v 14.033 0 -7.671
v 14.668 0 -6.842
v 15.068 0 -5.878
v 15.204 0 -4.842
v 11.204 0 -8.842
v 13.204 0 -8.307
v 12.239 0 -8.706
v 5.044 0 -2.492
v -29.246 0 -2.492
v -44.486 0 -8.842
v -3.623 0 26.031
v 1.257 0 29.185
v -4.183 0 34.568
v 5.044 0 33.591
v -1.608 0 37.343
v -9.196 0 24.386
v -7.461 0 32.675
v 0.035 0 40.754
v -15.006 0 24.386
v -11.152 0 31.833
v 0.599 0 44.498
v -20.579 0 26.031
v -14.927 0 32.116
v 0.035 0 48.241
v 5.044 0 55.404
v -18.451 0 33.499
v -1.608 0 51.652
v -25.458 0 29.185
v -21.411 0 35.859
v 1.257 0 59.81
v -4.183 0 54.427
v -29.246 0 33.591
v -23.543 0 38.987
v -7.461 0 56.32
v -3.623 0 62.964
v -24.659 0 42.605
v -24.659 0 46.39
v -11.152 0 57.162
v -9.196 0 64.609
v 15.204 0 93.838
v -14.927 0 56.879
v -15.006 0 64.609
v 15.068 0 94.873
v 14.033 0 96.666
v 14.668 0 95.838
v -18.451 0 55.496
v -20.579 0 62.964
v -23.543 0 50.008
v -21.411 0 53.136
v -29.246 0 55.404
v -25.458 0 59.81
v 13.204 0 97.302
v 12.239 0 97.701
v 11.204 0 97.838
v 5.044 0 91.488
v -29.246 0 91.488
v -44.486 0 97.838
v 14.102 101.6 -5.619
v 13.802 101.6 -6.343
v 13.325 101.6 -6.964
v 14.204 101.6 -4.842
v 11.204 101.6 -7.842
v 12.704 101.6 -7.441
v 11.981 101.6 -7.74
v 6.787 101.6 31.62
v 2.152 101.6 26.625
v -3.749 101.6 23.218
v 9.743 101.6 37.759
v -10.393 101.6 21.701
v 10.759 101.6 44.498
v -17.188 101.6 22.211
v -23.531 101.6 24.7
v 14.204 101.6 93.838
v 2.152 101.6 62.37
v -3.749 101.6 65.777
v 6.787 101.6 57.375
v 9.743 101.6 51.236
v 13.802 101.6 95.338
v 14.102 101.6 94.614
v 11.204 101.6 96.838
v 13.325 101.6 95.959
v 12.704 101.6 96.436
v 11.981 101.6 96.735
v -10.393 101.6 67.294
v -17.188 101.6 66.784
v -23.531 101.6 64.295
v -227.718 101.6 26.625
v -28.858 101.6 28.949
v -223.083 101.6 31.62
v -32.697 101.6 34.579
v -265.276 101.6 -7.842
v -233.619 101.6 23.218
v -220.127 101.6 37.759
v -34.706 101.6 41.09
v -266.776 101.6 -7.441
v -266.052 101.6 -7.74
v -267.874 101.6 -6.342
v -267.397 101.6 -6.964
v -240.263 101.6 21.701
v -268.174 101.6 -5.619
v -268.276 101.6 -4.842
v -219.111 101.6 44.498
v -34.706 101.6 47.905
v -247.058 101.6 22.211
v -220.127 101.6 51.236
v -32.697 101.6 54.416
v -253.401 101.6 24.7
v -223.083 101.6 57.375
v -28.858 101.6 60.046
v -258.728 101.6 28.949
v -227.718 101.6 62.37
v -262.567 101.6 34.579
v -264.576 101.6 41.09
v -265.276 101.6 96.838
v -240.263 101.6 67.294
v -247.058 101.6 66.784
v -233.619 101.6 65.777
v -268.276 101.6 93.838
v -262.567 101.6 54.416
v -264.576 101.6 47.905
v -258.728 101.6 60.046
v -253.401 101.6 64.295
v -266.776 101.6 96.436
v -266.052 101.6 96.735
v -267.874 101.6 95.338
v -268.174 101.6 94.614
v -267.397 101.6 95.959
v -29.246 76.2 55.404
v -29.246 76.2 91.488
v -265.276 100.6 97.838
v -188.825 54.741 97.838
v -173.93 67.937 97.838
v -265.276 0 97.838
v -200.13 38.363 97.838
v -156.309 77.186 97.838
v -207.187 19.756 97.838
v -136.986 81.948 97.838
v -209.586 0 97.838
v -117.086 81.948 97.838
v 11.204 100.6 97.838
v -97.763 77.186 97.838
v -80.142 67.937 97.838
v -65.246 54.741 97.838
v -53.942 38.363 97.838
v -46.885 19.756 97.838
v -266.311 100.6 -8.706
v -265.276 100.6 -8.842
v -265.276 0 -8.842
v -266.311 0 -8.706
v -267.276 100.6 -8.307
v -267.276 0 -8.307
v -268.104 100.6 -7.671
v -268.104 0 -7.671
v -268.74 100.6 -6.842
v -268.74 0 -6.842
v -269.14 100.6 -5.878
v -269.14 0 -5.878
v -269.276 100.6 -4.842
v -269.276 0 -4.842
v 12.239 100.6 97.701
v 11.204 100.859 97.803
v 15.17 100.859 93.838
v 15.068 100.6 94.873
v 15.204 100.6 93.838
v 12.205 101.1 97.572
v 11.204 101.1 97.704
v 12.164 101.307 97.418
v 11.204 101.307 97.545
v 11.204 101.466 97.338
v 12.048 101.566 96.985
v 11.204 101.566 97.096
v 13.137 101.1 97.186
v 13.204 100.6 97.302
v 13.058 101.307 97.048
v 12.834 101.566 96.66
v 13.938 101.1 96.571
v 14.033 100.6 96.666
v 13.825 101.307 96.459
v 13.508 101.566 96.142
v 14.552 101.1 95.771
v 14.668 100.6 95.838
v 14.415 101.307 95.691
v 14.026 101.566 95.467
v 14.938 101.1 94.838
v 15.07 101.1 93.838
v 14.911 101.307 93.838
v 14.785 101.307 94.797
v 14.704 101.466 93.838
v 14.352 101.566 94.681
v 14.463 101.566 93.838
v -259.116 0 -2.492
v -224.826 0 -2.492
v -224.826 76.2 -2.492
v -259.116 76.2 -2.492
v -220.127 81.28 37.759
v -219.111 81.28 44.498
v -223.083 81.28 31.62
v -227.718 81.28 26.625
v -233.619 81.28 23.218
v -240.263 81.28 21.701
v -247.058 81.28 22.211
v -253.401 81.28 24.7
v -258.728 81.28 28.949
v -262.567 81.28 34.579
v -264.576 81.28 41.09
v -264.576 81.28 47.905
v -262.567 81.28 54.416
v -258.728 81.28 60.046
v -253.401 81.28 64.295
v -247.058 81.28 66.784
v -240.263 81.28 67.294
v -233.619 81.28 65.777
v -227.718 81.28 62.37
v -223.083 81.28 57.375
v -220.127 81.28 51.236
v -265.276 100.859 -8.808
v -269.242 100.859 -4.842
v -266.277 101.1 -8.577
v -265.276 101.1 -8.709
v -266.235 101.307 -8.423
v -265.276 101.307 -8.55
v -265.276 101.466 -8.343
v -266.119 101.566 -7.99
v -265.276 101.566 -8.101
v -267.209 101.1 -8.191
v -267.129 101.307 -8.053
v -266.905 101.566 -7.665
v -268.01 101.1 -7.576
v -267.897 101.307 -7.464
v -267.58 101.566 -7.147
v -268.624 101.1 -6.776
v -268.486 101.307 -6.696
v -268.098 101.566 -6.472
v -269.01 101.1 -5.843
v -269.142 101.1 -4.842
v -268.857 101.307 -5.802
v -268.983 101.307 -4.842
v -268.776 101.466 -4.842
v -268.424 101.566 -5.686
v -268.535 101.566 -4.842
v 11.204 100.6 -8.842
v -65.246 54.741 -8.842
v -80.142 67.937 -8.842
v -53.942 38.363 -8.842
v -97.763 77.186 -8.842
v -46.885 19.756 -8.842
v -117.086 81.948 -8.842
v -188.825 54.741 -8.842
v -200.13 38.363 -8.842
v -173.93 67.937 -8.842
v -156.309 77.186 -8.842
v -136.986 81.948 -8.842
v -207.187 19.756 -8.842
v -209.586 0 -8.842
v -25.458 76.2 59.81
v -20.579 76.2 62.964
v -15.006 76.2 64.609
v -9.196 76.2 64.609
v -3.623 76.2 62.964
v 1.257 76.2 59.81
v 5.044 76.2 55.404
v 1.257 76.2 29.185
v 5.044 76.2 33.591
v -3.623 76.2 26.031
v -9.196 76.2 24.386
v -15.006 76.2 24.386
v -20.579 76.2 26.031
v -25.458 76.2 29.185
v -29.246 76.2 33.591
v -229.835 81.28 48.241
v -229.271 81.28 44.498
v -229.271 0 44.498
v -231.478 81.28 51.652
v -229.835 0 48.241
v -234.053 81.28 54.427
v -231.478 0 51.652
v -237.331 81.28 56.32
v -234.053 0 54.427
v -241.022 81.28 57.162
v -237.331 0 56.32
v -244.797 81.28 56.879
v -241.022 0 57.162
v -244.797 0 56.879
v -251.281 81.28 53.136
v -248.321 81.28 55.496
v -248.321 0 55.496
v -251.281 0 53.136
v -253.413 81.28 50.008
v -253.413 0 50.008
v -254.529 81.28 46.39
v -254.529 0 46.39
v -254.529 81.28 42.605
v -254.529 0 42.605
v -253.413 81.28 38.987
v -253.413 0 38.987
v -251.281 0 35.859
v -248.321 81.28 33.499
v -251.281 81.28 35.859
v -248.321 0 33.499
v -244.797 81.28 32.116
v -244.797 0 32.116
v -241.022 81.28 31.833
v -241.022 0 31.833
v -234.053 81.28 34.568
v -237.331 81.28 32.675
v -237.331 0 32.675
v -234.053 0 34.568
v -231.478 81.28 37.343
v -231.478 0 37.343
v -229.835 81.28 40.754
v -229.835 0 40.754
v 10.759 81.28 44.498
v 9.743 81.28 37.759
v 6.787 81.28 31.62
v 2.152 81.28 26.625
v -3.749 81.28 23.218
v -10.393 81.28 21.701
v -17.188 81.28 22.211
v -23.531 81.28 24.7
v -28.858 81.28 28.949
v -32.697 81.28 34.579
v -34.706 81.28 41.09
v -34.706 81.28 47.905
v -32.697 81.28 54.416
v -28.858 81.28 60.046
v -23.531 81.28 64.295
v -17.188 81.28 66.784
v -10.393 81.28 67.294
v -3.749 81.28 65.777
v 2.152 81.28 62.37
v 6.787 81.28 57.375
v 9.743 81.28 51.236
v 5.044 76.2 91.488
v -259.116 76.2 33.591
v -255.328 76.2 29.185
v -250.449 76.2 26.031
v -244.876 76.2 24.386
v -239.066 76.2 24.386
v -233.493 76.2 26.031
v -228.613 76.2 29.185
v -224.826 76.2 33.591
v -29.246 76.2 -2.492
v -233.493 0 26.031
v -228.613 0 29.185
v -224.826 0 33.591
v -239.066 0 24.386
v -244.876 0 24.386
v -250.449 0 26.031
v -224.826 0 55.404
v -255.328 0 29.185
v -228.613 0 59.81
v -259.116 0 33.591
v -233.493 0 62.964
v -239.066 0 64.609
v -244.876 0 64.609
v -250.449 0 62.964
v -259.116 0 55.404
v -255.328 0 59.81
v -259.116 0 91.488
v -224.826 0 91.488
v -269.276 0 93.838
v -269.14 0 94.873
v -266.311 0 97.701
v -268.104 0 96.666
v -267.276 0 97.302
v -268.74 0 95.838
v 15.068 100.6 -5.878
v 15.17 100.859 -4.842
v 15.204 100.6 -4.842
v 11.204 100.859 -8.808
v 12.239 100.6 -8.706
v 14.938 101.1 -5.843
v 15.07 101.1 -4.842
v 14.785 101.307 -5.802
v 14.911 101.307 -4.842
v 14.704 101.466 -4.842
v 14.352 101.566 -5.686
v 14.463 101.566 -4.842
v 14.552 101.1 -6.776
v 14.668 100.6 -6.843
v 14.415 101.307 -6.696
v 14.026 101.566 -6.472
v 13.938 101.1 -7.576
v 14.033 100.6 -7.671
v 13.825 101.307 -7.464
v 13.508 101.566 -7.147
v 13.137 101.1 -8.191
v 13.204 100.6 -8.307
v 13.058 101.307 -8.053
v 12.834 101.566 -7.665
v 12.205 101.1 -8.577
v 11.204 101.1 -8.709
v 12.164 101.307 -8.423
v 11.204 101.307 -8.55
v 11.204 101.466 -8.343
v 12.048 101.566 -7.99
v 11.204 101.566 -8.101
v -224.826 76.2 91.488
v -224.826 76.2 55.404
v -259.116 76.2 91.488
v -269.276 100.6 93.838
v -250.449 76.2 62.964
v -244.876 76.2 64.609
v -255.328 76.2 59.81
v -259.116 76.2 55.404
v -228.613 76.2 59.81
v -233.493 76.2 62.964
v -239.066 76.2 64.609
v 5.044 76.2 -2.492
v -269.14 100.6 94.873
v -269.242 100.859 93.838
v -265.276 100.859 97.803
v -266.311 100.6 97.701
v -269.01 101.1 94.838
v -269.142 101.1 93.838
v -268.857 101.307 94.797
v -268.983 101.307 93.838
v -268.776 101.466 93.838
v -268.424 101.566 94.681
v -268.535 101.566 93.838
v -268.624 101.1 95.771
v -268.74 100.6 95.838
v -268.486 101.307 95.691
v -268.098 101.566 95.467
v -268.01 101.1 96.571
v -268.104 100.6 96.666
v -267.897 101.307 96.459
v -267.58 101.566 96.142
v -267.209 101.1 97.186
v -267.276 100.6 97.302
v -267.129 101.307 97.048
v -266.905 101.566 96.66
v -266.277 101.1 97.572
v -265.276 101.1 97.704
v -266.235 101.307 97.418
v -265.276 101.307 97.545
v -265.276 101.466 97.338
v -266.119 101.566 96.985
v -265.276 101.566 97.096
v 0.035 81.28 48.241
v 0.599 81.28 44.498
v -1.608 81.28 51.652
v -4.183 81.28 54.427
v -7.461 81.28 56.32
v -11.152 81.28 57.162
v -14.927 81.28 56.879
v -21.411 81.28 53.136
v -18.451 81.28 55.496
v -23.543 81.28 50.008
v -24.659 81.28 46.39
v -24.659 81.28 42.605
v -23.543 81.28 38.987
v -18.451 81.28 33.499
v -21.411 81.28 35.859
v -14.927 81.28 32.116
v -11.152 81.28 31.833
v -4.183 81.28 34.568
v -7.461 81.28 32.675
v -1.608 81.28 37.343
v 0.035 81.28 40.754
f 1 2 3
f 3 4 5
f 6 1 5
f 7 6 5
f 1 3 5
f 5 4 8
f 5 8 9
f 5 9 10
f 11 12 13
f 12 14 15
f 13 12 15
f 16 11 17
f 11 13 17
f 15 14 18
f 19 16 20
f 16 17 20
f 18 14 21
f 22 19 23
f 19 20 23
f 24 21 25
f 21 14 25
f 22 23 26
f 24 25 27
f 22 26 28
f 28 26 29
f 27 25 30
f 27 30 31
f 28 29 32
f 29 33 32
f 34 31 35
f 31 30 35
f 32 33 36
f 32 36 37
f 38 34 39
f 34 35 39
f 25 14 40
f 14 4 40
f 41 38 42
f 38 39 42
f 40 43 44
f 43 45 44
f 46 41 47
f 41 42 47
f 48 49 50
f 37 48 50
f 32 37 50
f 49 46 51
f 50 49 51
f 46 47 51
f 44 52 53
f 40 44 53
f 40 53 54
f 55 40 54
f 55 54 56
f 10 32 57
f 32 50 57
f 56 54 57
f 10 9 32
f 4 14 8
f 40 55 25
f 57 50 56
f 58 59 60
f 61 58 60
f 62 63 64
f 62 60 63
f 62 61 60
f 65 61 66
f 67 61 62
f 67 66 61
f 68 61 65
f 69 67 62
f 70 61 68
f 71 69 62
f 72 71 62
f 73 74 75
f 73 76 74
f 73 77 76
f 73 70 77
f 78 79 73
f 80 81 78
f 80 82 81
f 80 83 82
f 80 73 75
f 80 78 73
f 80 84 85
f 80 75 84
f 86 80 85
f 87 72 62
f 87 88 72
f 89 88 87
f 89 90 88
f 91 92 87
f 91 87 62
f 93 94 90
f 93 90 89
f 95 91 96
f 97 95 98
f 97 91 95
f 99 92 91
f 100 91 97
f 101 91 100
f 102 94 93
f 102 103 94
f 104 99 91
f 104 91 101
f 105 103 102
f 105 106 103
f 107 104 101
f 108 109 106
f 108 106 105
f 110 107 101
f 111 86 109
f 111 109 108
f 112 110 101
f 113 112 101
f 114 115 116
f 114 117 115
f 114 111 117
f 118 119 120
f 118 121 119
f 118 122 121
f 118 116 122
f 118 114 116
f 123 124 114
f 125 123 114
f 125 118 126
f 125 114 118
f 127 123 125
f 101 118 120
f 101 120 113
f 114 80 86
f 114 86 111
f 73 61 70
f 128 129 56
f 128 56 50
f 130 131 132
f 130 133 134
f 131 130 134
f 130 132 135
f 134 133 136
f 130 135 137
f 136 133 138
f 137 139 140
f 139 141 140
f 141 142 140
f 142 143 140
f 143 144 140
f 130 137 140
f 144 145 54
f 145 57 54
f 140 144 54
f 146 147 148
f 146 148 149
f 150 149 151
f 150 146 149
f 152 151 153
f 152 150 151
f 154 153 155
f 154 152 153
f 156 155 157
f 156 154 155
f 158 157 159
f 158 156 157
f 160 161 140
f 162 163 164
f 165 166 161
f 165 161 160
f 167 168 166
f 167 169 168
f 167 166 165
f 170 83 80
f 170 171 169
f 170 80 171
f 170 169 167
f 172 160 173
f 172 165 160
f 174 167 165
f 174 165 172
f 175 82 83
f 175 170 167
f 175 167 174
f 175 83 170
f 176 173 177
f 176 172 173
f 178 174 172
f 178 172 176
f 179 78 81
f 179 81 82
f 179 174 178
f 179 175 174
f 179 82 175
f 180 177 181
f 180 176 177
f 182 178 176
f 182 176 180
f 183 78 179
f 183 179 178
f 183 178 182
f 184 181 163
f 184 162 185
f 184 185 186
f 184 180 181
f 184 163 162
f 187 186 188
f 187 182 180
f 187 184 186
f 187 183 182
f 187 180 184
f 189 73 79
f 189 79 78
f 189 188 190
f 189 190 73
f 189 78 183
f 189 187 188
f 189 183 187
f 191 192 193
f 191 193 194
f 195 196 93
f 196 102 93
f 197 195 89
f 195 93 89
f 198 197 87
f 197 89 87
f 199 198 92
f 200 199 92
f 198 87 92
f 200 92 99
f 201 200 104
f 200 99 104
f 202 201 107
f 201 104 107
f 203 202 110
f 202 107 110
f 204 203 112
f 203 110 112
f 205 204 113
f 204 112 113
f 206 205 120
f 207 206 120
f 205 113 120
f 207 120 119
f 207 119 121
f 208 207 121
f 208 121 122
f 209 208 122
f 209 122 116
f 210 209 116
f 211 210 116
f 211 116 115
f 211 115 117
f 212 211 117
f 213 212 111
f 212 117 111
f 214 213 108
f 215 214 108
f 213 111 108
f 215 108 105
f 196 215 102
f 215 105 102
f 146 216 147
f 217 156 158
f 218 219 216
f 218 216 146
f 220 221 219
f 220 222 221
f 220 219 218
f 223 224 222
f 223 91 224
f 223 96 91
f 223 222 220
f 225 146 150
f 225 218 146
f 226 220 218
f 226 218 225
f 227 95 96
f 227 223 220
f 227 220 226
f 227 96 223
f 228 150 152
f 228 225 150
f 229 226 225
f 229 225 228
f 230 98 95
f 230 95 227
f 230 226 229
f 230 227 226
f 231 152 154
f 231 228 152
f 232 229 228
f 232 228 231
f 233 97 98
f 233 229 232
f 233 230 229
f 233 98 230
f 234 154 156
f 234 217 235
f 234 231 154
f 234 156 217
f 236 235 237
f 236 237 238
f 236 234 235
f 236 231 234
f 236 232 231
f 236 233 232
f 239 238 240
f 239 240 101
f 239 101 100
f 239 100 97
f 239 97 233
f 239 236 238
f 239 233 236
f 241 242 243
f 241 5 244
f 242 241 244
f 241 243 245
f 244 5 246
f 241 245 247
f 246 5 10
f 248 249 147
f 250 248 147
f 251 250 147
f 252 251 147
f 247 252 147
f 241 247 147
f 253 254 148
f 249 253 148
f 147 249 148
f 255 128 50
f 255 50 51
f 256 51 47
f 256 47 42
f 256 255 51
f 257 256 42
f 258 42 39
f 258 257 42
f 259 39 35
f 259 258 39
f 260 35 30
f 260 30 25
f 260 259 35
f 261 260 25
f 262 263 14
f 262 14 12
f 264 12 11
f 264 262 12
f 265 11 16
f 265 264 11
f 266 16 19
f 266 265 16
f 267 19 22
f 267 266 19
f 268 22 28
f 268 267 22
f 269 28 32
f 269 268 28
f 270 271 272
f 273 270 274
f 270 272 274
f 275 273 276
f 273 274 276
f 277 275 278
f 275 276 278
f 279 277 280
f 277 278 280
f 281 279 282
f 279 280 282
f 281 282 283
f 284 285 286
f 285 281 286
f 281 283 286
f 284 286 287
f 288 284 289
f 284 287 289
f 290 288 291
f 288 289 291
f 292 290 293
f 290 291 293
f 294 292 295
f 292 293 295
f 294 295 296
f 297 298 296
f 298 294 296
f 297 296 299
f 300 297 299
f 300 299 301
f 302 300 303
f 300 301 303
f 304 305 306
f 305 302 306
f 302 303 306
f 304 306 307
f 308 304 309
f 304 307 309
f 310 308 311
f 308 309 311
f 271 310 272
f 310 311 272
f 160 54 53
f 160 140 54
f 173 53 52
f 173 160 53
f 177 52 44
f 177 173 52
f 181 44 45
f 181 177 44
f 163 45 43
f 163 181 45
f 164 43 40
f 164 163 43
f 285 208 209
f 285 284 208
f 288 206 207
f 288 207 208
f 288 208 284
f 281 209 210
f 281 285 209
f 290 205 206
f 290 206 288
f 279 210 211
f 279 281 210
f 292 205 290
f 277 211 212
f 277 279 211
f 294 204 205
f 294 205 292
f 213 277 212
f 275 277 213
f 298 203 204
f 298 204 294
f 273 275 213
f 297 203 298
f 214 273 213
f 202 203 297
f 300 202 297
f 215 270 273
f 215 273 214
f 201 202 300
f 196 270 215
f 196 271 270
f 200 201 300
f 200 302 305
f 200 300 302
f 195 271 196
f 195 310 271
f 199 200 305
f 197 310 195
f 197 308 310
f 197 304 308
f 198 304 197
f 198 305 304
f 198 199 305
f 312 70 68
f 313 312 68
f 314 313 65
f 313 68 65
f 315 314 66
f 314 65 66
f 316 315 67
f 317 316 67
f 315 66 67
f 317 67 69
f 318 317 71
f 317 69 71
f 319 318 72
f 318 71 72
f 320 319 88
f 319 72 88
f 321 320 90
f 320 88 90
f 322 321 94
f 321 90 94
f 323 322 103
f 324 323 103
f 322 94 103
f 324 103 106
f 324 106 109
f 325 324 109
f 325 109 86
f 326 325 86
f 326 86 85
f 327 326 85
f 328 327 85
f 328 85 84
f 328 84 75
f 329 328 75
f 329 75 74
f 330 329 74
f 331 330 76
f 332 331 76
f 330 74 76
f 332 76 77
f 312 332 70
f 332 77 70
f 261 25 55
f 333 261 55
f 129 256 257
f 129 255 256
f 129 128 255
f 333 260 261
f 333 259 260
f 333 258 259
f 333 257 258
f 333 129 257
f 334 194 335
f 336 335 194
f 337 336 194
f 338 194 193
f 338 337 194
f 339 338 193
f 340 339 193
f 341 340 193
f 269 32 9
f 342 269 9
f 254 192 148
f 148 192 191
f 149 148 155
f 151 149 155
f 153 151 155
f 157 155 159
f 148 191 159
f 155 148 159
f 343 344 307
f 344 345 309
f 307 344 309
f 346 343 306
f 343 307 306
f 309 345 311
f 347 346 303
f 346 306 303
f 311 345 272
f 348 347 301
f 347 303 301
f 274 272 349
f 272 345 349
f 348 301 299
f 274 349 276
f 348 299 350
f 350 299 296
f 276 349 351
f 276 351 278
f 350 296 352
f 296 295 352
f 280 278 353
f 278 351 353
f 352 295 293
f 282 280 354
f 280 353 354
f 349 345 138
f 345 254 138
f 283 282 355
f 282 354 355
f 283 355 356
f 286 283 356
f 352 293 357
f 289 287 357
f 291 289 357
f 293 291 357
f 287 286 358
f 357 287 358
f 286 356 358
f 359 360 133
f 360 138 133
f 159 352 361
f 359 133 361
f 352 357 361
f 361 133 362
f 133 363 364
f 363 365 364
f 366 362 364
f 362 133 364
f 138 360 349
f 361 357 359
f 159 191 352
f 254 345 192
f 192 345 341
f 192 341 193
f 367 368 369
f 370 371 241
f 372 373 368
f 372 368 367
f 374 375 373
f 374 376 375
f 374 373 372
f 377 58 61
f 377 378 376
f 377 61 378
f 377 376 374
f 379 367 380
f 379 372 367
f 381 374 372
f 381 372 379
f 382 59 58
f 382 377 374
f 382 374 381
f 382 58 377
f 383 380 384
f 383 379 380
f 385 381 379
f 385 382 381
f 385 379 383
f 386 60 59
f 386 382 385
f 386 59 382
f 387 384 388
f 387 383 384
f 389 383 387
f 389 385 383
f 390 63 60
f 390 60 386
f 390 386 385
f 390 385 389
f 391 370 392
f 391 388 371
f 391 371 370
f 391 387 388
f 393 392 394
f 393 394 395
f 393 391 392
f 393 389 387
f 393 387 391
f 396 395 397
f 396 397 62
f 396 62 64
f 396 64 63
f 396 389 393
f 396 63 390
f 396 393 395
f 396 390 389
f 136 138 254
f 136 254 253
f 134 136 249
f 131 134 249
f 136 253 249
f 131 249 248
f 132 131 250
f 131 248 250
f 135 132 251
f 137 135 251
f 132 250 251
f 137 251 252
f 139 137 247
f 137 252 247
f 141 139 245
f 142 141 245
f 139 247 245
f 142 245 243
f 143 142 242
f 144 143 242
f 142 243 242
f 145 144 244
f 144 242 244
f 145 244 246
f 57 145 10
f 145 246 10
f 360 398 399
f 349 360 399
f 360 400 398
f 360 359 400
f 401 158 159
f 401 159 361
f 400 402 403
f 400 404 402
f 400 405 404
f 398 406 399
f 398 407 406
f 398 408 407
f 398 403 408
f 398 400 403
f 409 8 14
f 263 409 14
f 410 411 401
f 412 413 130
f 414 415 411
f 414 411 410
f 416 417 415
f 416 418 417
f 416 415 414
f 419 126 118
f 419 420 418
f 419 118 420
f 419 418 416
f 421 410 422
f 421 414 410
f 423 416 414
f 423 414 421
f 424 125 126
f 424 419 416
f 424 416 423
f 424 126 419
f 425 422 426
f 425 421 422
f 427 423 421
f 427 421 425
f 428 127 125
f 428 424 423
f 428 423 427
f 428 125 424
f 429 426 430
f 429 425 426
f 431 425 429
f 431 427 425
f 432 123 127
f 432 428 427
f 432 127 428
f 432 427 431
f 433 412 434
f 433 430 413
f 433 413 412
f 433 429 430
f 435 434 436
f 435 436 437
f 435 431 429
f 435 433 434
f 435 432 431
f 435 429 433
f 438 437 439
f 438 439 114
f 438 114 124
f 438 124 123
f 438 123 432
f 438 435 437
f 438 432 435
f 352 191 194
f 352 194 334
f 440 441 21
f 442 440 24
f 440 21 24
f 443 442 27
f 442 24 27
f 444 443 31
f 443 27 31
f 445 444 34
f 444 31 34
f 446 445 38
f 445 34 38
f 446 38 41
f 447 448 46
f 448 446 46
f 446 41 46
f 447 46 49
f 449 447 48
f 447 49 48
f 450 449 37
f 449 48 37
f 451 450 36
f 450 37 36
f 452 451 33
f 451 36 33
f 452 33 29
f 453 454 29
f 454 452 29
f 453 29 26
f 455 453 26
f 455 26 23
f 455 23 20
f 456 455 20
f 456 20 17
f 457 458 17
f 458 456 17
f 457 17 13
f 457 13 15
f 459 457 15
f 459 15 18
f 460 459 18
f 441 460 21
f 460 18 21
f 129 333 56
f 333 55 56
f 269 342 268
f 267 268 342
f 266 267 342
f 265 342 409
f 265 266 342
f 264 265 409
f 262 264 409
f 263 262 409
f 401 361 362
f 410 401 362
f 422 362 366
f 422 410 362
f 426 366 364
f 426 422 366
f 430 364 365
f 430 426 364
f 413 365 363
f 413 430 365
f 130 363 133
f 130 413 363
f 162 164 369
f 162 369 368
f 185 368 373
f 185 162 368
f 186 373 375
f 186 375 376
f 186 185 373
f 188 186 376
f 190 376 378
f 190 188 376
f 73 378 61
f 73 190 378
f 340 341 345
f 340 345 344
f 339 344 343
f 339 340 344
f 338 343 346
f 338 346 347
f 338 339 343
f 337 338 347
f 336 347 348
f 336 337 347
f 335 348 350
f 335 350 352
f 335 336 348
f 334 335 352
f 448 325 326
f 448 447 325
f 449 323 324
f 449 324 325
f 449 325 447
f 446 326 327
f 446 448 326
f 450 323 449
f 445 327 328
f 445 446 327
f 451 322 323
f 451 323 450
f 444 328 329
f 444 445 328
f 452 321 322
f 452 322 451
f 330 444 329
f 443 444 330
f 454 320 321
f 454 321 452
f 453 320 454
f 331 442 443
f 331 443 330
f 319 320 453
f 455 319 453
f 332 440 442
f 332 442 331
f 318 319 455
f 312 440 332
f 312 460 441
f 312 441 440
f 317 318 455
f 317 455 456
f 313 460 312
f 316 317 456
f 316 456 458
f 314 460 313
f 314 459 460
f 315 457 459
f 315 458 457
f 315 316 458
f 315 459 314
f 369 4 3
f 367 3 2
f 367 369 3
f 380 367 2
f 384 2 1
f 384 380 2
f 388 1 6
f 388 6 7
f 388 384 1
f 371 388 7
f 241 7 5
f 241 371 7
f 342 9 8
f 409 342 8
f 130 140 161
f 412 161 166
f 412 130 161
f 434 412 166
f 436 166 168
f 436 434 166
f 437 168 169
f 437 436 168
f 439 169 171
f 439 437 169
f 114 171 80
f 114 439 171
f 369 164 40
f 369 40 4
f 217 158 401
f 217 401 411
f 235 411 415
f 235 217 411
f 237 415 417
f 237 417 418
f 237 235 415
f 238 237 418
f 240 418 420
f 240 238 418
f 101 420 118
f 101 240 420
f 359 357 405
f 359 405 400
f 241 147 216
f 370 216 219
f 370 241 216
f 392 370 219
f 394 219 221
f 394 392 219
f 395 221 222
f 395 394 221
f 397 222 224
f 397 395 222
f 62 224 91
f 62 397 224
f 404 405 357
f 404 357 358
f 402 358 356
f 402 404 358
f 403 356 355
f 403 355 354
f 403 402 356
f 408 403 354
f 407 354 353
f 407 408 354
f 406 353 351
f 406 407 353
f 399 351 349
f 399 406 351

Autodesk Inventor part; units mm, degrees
ref_plane "YZ Plane" through (0, 0, 0) normal (1, 0, 0) x (0, 1, 0)
ref_plane "XZ Plane" through (0, 0, 0) normal (0, 1, 0) x (-1, 0, 0)
ref_plane "XY Plane" through (0, 0, 0) normal (0, 0, 1) x (1, 0, 0)
sketch "Sketch2" plane through (0, 0, 0) normal (0, 1, 0) x (-1, 0, 0)
  line L0 (-15.2041, -8.8425) -> (269.2759, -8.8425)
  line L1 (269.2759, -8.8425) -> (269.2759, 97.8375)
  line L2 (269.2759, 97.8375) -> (-15.2041, 97.8375)
  line L3 (-15.2041, 97.8375) -> (-15.2041, -8.8425)
  point P0 (0, 0)
  dimension "d5" = 284.48
  dimension "d6" = 106.68
  dimension "d7" = 284.48
  dimension "d8" = 106.68
extrude "Extrusion1" add sketch "Sketch2" along normal blind 101.6
sketch "Sketch3" plane through (15.2041, 0, -8.8425) normal (0, 0, -1) x (-1, 0, 0)
  line L0 (0, 0) -> (284.48, 0) projected
  arc A0 (224.79, 0) -> (59.69, 0) centre (142.24, 0) ccw
  line L1 (59.69, 0) -> (224.79, 0)
  point P0 (15.2041, 0)
extrude "Extrusion2" cut sketch "Sketch3" against normal blind 127
sketch "Sketch4" plane through (0, 0, 0) normal (0, -1, 0) x (1, 0, 0)
  line L0 (-209.5859, -8.8425) -> (-209.5859, 97.8375) projected
  line L1 (-269.2759, 97.8375) -> (-209.5859, 97.8375) projected
  line L2 (-269.2759, -8.8425) -> (-269.2759, 97.8375) projected
  line L3 (-209.5859, -8.8425) -> (-269.2759, -8.8425) projected
  line L4 (-44.4859, 97.8375) -> (15.2041, 97.8375) projected
  line L5 (-44.4859, 97.8375) -> (-44.4859, -8.8425) projected
  line L6 (15.2041, -8.8425) -> (-44.4859, -8.8425) projected
  line L7 (15.2041, 97.8375) -> (15.2041, -8.8425) projected
  line L8 (-44.4859, 97.8375) -> (15.2041, 97.8375) projected
  line L9 (-241.3709, 97.8375) -> (-241.3709, 91.4875) construction
  line L10 (-209.5859, 77.888) -> (-224.8259, 77.888) construction
  line L11 (-269.2759, 47.5596) -> (-259.1159, 47.5596) construction
  line L12 (-239.4309, -8.8425) -> (-239.4309, -2.4925) construction
  line L13 (-259.1159, -2.4925) -> (-259.1159, 91.4875)
  line L14 (-259.1159, 91.4875) -> (-224.8259, 91.4875)
  line L15 (-224.8259, 91.4875) -> (-224.8259, -2.4925)
  line L16 (-224.8259, -2.4925) -> (-259.1159, -2.4925)
  point P0 (0, 0)
  dimension "d15" = 6.35
  dimension "d16" = 15.24
  dimension "d17" = 10.16
  dimension "d18" = 6.35
extrude "Extrusion3" cut sketch "Sketch4" against normal blind 76.2 contours L13 L14 L15 L16
sketch "Sketch5" plane through (0, 76.2, 0) normal (0, -1, 0) x (1, 0, 0)
  line L0 (-259.1159, 91.4875) -> (-224.8259, 91.4875) projected
  line L1 (-259.1159, -2.4925) -> (-259.1159, 91.4875) projected
  line L2 (-224.8259, -2.4925) -> (-259.1159, -2.4925) projected
  line L3 (-224.8259, 91.4875) -> (-224.8259, -2.4925) projected
  line L4 (-259.1159, 44.4975) -> (-224.8259, 44.4975) construction
  line L5 (-241.9709, 91.4875) -> (-241.9709, 84.1907) construction
  line L6 (-241.9709, 84.1907) -> (-241.9709, 84.1907) construction
  line L7 (-241.9709, 84.1907) -> (-241.9709, -2.4925) construction
  circle A0 centre (-241.9709, 44.4975) radius 20.32
  point P0 (0, 0)
  dimension "d21" = 40.64
  dimension "d22" = 0
extrude "Extrusion4" add sketch "Sketch5" along normal blind 76.2 contours A0 L3 L1 | L1 A0 | A0 L3
sketch "Sketch6" plane through (0, 0, 0) normal (0, -1, 0) x (1, 0, 0)
  arc A0 (-259.1159, 33.5911) -> (-224.8259, 33.5911) centre (-241.9709, 44.4975) ccw projected
  circle A1 centre (-241.9709, 44.4975) radius 12.7
  point P0 (0, 0)
  dimension "d25" = 25.4
extrude "Extrusion5" cut sketch "Sketch6" against normal blind 101.6
sketch "Sketch7" plane through (0, 101.6, 0) normal (0, 1, 0) x (1, 0, 0)
  circle A0 centre (-241.9709, -44.4975) radius 12.7 projected
  circle A1 centre (-241.9709, -44.4975) radius 22.86
  point P0 (0, 0)
  dimension "d29" = 45.72
extrude "Extrusion6" cut sketch "Sketch7" against normal blind 20.32
sketch "Sketch8" plane through (0, 0, 0) normal (0, -1, 0) x (1, 0, 0)
  line L0 (-44.4859, 97.8375) -> (-44.4859, -8.8425) projected
  line L1 (15.2041, -8.8425) -> (-44.4859, -8.8425) projected
  line L2 (15.2041, 97.8375) -> (15.2041, -8.8425) projected
  line L3 (-44.4859, 97.8375) -> (15.2041, 97.8375) projected
  line L4 (-44.4859, 51.8911) -> (-29.2459, 51.8911) construction
  line L5 (15.2041, 49.6514) -> (5.0441, 49.6514) construction
  line L6 (-16.6435, -8.8425) -> (-16.6435, -2.4925) construction
  line L7 (-14.6409, 97.8375) -> (-14.6409, 91.4875) construction
  line L8 (5.0441, 91.4875) -> (-29.2459, 91.4875)
  line L9 (-29.2459, 91.4875) -> (-29.2459, -2.4925)
  line L10 (-29.2459, -2.4925) -> (5.0441, -2.4925)
  line L11 (5.0441, -2.4925) -> (5.0441, 91.4875)
  point P0 (0, 0)
  dimension "d32" = 15.24
  dimension "d33" = 10.16
  dimension "d34" = 6.35
  dimension "d35" = 6.35
extrude "Extrusion7" cut sketch "Sketch8" against normal blind 76.2 contours L11 L10 L9 L8
sketch "Sketch9" plane through (0, 76.2, 0) normal (0, -1, 0) x (1, 0, 0)
  line L0 (-29.2459, 91.4875) -> (5.0441, 91.4875) projected
  line L1 (-29.2459, -2.4925) -> (-29.2459, 91.4875) projected
  line L2 (5.0441, -2.4925) -> (-29.2459, -2.4925) projected
  line L3 (-12.1009, -2.4925) -> (-12.1009, 91.4875) construction
  line L4 (-29.2459, 44.4975) -> (0, 44.4975) construction
  circle A0 centre (-12.1009, 44.4975) radius 20.32
  point P0 (0, 0)
  dimension "d38" = 40.64
extrude "Extrusion8" add sketch "Sketch9" along normal blind 76.2
sketch "Sketch10" plane through (0, 0, 0) normal (0, -1, 0) x (1, 0, 0)
  arc A0 (-29.2459, 33.5911) -> (5.0441, 33.5911) centre (-12.1009, 44.4975) ccw projected
  circle A1 centre (-12.1009, 44.4975) radius 12.7
  point P0 (0, 0)
  dimension "d41" = 25.4
extrude "Extrusion9" cut sketch "Sketch10" against normal blind 101.6
sketch "Sketch11" plane through (0, 101.6, 0) normal (0, 1, 0) x (1, 0, 0)
  circle A0 centre (-12.1009, -44.4975) radius 12.7 projected
  circle A1 centre (-12.1009, -44.4975) radius 22.86
  point P0 (0, 0)
  dimension "d44" = 45.72
extrude "Extrusion10" cut sketch "Sketch11" against normal blind 20.32
fillet "Fillet1" radius 4 4 edges at (15.2041, 50.8, 97.8375) (15.2041, 50.8, -8.8425) (-269.2759, 50.8, 97.8375) (-269.2759, 50.8, -8.8425)
fillet "Fillet2" radius 1 8 edges at (14.0325, 101.6, 96.666) (15.2041, 101.6, 44.4975) (14.0325, 101.6, -7.6709) (-127.0359, 101.6, -8.8425) (-268.1044, 101.6, -7.6709) (-269.2759, 101.6, 44.4975) (-268.1044, 101.6, 96.666) (-127.0359, 101.6, 97.8375)
properties part number "CIM mount" material "Polypropylene"
